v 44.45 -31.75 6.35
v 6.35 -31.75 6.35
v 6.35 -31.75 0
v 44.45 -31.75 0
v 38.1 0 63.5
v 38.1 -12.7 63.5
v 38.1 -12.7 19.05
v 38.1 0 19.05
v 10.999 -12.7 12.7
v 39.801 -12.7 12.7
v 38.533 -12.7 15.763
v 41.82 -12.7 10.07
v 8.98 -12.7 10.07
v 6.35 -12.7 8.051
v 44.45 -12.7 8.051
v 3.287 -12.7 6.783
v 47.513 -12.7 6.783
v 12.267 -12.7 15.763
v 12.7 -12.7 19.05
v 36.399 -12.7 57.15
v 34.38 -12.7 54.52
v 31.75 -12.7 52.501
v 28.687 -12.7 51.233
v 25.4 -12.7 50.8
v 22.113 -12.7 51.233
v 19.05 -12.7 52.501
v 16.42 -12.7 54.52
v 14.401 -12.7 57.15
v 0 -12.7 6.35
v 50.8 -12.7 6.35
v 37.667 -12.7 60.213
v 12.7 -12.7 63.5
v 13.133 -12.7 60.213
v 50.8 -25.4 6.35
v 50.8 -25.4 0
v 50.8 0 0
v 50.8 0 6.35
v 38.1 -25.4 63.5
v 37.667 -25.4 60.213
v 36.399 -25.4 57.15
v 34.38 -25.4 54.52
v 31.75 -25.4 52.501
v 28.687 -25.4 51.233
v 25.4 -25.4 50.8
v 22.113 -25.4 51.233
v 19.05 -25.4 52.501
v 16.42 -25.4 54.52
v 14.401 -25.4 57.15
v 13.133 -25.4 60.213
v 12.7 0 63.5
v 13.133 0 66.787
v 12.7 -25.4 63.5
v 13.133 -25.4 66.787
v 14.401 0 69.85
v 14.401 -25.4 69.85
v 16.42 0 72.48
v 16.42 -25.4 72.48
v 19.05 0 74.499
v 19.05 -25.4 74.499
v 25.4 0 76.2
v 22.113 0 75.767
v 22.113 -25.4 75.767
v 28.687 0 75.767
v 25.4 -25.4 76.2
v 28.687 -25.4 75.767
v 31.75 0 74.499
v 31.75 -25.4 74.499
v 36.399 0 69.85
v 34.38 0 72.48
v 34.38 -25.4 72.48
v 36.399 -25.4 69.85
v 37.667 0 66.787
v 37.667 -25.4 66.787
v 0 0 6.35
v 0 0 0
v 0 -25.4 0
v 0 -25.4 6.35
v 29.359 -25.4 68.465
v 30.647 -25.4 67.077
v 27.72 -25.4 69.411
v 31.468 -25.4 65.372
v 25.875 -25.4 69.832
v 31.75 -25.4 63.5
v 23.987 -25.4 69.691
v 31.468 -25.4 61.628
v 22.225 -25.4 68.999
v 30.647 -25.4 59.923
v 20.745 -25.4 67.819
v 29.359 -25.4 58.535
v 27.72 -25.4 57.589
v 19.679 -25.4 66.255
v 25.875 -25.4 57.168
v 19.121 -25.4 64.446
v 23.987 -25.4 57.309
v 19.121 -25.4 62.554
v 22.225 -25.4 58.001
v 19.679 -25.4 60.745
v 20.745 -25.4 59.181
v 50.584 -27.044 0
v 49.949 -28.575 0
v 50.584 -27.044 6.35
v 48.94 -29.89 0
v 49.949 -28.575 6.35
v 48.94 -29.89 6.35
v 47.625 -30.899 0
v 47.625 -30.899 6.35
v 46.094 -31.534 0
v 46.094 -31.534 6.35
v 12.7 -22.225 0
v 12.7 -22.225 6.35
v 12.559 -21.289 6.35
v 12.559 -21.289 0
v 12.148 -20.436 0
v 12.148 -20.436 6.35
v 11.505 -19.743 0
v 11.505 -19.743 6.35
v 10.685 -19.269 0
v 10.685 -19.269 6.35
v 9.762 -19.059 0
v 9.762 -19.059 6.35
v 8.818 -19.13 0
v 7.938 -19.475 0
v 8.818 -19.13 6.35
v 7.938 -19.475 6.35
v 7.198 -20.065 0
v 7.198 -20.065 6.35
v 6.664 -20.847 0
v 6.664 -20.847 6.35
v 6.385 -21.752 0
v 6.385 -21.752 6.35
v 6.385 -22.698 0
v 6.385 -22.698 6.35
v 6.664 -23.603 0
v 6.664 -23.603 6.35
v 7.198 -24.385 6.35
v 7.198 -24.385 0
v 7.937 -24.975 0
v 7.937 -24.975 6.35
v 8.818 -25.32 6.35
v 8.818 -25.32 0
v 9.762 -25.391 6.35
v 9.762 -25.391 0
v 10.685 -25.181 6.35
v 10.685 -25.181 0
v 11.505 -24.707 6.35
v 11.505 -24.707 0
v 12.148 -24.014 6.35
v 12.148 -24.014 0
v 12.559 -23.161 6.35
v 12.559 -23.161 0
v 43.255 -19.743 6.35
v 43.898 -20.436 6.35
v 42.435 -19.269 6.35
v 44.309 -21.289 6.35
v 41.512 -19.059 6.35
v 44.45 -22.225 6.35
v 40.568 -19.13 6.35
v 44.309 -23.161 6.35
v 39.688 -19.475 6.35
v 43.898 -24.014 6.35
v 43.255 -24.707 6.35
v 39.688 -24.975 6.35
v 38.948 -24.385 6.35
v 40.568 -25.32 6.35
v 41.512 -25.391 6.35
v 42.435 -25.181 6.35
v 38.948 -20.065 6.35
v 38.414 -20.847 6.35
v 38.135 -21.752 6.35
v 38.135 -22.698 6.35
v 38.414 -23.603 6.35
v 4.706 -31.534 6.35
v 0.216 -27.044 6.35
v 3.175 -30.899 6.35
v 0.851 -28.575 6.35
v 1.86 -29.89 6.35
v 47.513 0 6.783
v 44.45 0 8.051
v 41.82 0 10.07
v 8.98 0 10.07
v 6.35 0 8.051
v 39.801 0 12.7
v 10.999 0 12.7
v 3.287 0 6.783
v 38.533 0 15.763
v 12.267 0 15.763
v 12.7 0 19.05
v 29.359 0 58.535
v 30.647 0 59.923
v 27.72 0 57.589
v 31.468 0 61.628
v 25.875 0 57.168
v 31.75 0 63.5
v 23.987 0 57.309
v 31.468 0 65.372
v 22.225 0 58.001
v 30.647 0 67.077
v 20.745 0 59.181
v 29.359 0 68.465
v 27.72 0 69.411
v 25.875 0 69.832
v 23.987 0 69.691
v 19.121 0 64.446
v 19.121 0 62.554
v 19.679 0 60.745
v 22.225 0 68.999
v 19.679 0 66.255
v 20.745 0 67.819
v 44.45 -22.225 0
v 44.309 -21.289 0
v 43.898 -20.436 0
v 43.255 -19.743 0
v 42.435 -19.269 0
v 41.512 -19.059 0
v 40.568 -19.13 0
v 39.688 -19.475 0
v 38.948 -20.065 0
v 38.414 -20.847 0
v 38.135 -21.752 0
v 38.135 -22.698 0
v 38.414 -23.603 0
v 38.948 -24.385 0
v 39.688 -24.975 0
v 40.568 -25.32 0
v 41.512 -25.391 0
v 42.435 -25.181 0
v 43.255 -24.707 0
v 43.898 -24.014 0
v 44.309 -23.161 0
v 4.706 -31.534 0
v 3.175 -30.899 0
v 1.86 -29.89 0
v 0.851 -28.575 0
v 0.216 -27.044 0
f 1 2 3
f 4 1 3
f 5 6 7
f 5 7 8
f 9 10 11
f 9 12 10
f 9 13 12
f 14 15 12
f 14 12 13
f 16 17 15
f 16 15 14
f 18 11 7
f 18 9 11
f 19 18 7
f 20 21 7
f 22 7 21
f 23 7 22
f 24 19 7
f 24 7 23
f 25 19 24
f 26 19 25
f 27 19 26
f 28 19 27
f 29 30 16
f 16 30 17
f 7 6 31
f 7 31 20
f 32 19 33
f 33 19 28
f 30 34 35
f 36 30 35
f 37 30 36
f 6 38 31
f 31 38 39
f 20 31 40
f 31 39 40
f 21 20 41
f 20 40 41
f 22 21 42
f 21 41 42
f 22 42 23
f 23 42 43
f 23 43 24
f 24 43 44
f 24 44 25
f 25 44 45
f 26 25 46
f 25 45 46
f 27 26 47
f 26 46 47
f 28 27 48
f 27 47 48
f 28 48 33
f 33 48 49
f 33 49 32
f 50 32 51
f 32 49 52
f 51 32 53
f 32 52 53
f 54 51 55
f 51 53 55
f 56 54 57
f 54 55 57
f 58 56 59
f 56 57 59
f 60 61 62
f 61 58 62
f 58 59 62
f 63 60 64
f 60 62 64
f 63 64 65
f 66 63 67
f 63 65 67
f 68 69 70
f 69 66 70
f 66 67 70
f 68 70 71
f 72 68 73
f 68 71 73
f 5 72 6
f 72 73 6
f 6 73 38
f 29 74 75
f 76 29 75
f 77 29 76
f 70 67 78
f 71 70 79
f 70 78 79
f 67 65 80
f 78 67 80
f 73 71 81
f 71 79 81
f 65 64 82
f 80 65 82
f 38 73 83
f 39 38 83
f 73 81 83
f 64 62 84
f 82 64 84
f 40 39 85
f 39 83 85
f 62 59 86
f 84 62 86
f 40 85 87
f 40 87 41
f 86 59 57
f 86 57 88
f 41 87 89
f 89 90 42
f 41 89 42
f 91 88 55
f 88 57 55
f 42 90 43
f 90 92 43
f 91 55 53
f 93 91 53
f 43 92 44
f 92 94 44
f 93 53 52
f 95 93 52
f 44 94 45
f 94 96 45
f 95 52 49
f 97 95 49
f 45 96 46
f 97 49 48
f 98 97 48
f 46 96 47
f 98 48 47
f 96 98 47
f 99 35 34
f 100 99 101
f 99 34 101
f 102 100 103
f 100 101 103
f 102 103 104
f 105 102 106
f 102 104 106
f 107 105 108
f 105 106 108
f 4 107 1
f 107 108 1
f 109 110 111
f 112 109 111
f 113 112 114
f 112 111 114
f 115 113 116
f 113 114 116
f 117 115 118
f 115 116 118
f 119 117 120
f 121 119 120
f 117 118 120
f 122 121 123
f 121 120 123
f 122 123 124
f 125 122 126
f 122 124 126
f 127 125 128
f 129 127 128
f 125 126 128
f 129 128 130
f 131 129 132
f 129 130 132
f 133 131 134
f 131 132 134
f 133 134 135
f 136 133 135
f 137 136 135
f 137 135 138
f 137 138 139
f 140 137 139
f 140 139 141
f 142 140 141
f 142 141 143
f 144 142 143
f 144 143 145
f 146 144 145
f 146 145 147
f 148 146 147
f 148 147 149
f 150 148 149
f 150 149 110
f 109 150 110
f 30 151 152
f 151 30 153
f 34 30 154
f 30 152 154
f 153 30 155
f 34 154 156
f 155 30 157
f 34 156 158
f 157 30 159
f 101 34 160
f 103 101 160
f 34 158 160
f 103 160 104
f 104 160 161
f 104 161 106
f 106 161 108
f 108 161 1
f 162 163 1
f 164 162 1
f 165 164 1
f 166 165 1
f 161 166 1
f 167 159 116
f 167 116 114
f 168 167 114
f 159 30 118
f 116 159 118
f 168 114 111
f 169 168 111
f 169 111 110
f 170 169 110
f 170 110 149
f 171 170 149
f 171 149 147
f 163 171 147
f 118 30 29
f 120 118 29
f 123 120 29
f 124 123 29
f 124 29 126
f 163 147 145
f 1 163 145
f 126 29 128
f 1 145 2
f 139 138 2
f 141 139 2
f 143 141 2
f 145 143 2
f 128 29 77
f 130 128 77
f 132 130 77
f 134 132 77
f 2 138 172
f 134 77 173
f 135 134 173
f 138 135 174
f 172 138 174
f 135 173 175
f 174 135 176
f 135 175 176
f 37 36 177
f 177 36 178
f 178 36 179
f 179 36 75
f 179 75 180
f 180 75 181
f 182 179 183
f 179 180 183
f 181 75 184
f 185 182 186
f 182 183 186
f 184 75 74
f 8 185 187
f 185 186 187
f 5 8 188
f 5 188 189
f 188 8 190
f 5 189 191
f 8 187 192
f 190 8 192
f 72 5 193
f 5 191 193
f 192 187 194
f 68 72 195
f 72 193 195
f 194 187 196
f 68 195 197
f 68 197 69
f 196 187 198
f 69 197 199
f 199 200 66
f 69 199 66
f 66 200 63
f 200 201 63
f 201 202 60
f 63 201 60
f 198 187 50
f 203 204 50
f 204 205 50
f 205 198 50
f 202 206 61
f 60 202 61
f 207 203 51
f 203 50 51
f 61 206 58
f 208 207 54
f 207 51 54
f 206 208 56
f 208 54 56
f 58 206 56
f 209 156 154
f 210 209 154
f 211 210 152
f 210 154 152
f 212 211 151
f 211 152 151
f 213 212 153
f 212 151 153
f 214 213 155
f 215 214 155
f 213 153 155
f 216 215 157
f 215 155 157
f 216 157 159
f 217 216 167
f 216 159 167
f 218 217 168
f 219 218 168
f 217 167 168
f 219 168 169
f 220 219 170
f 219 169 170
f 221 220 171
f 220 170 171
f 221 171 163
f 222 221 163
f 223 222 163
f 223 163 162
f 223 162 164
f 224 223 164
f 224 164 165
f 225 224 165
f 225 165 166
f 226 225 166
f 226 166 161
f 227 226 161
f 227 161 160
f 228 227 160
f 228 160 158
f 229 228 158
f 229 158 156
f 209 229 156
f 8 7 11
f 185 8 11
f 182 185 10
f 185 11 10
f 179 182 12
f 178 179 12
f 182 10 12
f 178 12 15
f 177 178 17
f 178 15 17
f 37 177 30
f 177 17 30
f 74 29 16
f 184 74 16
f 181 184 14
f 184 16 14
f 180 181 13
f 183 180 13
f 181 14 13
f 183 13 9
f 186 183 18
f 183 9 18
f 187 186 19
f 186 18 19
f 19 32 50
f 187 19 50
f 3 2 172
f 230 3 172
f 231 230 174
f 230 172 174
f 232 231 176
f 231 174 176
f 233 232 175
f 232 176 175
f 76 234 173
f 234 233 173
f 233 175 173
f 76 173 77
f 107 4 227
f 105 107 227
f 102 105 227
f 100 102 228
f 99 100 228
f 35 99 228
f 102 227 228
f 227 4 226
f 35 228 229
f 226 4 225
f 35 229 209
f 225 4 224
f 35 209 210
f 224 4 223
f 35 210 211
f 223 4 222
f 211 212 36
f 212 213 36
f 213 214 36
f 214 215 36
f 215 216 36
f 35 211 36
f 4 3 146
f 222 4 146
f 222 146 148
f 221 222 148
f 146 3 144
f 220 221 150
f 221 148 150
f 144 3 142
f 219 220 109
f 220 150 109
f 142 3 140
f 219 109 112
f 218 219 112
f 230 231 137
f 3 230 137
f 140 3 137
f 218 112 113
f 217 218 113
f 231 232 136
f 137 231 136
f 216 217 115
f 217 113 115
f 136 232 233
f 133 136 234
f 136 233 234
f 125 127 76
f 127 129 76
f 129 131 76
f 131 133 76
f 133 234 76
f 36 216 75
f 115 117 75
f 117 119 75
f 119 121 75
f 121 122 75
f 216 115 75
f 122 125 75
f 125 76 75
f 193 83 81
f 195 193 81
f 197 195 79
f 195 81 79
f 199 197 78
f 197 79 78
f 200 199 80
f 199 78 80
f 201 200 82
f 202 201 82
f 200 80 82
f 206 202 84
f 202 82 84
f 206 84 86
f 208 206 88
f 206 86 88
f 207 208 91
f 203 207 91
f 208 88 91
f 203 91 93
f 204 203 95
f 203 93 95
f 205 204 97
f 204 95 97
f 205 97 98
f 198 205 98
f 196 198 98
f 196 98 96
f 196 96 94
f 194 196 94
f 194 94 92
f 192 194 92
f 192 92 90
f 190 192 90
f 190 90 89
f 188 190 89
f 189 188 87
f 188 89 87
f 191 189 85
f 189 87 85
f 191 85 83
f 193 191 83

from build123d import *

# Parameters (mm, degrees)
F1_DEPTH  = 50.8
F2_W      = 12.7
F2_H      = 25.4
F3_DEPTH  = 69.85
F5_DEPTH  = 12.7
F6_DEPTH  = 25.4
F7_R      = 6.35
F8_DEPTH  = 25.4
F9_W      = 12.7
F9_H      = 12.7
F10_DEPTH = 12.7
F11_W     = 12.7
F11_H     = 12.7
F12_DEPTH = 12.7
F14_DEPTH = 25.4
F15_R     = 3.175
F16_DEPTH = 25.4
F18_DEPTH = 25.4


with BuildPart() as f1:
    # F0 (on Right) → F1 (new body)
    with BuildSketch(Plane.YZ):
        Polygon((-31.75, 0), (0, 0), (0, 76.2), (-25.4, 76.2), (-25.4, 50.8), (-12.7, 50.8), (-12.7, 6.35), (-31.75, 6.35), align=None)
    extrude(amount=F1_DEPTH)

    # F2 (on face) → F3 (cut)
    with BuildSketch(Plane.XY.offset(76.2)):
        with Locations((6.35, -12.7)):
            Rectangle(F2_W, F2_H)
        with Locations((44.45, -12.7)):
            Rectangle(F2_W, F2_H)
    extrude(amount=-F3_DEPTH, mode=Mode.SUBTRACT)

    # F4 (on face) → F5 (cut)
    with BuildSketch(Plane.XZ.offset(25.4)):
        with BuildLine():
            ThreePointArc((12.7, 63.5), (16.4197438789, 72.4802561211), (25.4, 76.2))
            Line((25.4, 76.2), (12.7, 76.2))
            Line((12.7, 76.2), (12.7, 63.5))
        make_face()
        with BuildLine():
            ThreePointArc((25.4, 76.2), (34.3802561211, 72.4802561211), (38.1, 63.5))
            Line((38.1, 63.5), (38.1, 76.2))
            Line((38.1, 76.2), (25.4, 76.2))
        make_face()
        with BuildLine():
            Line((12.7, 50.8), (25.4, 50.8))
            ThreePointArc((25.4, 50.8), (16.4197438789, 54.5197438789), (12.7, 63.5))
            Line((12.7, 63.5), (12.7, 50.8))
        make_face()
        with BuildLine():
            Line((38.1, 50.8), (38.1, 63.5))
            ThreePointArc((38.1, 63.5), (34.3802561211, 54.5197438789), (25.4, 50.8))
            Line((25.4, 50.8), (38.1, 50.8))
        make_face()
    extrude(amount=-F5_DEPTH, mode=Mode.SUBTRACT)

    # F6 (cut): faces of the model
    f6_faces = [f1.faces().sort_by_distance(p)[0] for p in [
        (15.5367728246, -12.7, 73.3632271754),
        (35.2632271754, -12.7, 73.3632271754),
    ]]
    extrude(f6_faces, amount=-F6_DEPTH, mode=Mode.SUBTRACT)

    # F7 (on face) → F8 (cut)
    with BuildSketch(Plane.XZ.offset(25.4)):
        with Locations((25.4, 63.5)):
            Circle(F7_R)
    extrude(amount=-F8_DEPTH, mode=Mode.SUBTRACT)

    # F9 (on face) → F10 (join)
    with BuildSketch(Plane(origin=(12.7, 0, 0), x_dir=(0, -1, 0), z_dir=(-1, 0, 0))):
        with Locations((6.35, 12.7)):
            Rectangle(F9_W, F9_H)
    extrude(amount=F10_DEPTH)

    # F11 (on face) → F12 (join)
    with BuildSketch(Plane.YZ.offset(38.1)):
        with Locations((-6.35, 12.7)):
            Rectangle(F11_W, F11_H)
    extrude(amount=F12_DEPTH)

    # F13 (on face) → F14 (cut)
    with BuildSketch(Plane.XZ.offset(12.7)):
        with BuildLine():
            ThreePointArc((0, 6.35), (8.9802561211, 10.0697438789), (12.7, 19.05))
            Line((12.7, 19.05), (0, 19.05))
            Line((0, 19.05), (0, 6.35))
        make_face()
        with BuildLine():
            ThreePointArc((38.1, 19.05), (41.8197438789, 10.0697438789), (50.8, 6.35))
            Line((50.8, 6.35), (50.8, 19.05))
            Line((50.8, 19.05), (38.1, 19.05))
        make_face()
    extrude(amount=-F14_DEPTH, mode=Mode.SUBTRACT)

    # F15 (on face) → F16 (cut)
    with BuildSketch(Plane.XY.offset(6.35)):
        with Locations((9.525, -22.225)):
            Circle(F15_R)
        with Locations((41.275, -22.225)):
            Circle(F15_R)
    extrude(amount=-F16_DEPTH, mode=Mode.SUBTRACT)

    # F17 (on face) → F18 (cut)
    with BuildSketch(Plane.XY.offset(6.35)):
        with BuildLine():
            Line((0, -31.75), (6.35, -31.75))
            ThreePointArc((6.35, -31.75), (1.8598719395, -29.8901280605), (0, -25.4))
            Line((0, -25.4), (0, -31.75))
        make_face()
        with BuildLine():
            ThreePointArc((50.8, -25.4), (48.9401280605, -29.8901280605), (44.45, -31.75))
            Line((44.45, -31.75), (50.8, -31.75))
            Line((50.8, -31.75), (50.8, -25.4))
        make_face()
    extrude(amount=-F18_DEPTH, mode=Mode.SUBTRACT)


solid = f1.part
